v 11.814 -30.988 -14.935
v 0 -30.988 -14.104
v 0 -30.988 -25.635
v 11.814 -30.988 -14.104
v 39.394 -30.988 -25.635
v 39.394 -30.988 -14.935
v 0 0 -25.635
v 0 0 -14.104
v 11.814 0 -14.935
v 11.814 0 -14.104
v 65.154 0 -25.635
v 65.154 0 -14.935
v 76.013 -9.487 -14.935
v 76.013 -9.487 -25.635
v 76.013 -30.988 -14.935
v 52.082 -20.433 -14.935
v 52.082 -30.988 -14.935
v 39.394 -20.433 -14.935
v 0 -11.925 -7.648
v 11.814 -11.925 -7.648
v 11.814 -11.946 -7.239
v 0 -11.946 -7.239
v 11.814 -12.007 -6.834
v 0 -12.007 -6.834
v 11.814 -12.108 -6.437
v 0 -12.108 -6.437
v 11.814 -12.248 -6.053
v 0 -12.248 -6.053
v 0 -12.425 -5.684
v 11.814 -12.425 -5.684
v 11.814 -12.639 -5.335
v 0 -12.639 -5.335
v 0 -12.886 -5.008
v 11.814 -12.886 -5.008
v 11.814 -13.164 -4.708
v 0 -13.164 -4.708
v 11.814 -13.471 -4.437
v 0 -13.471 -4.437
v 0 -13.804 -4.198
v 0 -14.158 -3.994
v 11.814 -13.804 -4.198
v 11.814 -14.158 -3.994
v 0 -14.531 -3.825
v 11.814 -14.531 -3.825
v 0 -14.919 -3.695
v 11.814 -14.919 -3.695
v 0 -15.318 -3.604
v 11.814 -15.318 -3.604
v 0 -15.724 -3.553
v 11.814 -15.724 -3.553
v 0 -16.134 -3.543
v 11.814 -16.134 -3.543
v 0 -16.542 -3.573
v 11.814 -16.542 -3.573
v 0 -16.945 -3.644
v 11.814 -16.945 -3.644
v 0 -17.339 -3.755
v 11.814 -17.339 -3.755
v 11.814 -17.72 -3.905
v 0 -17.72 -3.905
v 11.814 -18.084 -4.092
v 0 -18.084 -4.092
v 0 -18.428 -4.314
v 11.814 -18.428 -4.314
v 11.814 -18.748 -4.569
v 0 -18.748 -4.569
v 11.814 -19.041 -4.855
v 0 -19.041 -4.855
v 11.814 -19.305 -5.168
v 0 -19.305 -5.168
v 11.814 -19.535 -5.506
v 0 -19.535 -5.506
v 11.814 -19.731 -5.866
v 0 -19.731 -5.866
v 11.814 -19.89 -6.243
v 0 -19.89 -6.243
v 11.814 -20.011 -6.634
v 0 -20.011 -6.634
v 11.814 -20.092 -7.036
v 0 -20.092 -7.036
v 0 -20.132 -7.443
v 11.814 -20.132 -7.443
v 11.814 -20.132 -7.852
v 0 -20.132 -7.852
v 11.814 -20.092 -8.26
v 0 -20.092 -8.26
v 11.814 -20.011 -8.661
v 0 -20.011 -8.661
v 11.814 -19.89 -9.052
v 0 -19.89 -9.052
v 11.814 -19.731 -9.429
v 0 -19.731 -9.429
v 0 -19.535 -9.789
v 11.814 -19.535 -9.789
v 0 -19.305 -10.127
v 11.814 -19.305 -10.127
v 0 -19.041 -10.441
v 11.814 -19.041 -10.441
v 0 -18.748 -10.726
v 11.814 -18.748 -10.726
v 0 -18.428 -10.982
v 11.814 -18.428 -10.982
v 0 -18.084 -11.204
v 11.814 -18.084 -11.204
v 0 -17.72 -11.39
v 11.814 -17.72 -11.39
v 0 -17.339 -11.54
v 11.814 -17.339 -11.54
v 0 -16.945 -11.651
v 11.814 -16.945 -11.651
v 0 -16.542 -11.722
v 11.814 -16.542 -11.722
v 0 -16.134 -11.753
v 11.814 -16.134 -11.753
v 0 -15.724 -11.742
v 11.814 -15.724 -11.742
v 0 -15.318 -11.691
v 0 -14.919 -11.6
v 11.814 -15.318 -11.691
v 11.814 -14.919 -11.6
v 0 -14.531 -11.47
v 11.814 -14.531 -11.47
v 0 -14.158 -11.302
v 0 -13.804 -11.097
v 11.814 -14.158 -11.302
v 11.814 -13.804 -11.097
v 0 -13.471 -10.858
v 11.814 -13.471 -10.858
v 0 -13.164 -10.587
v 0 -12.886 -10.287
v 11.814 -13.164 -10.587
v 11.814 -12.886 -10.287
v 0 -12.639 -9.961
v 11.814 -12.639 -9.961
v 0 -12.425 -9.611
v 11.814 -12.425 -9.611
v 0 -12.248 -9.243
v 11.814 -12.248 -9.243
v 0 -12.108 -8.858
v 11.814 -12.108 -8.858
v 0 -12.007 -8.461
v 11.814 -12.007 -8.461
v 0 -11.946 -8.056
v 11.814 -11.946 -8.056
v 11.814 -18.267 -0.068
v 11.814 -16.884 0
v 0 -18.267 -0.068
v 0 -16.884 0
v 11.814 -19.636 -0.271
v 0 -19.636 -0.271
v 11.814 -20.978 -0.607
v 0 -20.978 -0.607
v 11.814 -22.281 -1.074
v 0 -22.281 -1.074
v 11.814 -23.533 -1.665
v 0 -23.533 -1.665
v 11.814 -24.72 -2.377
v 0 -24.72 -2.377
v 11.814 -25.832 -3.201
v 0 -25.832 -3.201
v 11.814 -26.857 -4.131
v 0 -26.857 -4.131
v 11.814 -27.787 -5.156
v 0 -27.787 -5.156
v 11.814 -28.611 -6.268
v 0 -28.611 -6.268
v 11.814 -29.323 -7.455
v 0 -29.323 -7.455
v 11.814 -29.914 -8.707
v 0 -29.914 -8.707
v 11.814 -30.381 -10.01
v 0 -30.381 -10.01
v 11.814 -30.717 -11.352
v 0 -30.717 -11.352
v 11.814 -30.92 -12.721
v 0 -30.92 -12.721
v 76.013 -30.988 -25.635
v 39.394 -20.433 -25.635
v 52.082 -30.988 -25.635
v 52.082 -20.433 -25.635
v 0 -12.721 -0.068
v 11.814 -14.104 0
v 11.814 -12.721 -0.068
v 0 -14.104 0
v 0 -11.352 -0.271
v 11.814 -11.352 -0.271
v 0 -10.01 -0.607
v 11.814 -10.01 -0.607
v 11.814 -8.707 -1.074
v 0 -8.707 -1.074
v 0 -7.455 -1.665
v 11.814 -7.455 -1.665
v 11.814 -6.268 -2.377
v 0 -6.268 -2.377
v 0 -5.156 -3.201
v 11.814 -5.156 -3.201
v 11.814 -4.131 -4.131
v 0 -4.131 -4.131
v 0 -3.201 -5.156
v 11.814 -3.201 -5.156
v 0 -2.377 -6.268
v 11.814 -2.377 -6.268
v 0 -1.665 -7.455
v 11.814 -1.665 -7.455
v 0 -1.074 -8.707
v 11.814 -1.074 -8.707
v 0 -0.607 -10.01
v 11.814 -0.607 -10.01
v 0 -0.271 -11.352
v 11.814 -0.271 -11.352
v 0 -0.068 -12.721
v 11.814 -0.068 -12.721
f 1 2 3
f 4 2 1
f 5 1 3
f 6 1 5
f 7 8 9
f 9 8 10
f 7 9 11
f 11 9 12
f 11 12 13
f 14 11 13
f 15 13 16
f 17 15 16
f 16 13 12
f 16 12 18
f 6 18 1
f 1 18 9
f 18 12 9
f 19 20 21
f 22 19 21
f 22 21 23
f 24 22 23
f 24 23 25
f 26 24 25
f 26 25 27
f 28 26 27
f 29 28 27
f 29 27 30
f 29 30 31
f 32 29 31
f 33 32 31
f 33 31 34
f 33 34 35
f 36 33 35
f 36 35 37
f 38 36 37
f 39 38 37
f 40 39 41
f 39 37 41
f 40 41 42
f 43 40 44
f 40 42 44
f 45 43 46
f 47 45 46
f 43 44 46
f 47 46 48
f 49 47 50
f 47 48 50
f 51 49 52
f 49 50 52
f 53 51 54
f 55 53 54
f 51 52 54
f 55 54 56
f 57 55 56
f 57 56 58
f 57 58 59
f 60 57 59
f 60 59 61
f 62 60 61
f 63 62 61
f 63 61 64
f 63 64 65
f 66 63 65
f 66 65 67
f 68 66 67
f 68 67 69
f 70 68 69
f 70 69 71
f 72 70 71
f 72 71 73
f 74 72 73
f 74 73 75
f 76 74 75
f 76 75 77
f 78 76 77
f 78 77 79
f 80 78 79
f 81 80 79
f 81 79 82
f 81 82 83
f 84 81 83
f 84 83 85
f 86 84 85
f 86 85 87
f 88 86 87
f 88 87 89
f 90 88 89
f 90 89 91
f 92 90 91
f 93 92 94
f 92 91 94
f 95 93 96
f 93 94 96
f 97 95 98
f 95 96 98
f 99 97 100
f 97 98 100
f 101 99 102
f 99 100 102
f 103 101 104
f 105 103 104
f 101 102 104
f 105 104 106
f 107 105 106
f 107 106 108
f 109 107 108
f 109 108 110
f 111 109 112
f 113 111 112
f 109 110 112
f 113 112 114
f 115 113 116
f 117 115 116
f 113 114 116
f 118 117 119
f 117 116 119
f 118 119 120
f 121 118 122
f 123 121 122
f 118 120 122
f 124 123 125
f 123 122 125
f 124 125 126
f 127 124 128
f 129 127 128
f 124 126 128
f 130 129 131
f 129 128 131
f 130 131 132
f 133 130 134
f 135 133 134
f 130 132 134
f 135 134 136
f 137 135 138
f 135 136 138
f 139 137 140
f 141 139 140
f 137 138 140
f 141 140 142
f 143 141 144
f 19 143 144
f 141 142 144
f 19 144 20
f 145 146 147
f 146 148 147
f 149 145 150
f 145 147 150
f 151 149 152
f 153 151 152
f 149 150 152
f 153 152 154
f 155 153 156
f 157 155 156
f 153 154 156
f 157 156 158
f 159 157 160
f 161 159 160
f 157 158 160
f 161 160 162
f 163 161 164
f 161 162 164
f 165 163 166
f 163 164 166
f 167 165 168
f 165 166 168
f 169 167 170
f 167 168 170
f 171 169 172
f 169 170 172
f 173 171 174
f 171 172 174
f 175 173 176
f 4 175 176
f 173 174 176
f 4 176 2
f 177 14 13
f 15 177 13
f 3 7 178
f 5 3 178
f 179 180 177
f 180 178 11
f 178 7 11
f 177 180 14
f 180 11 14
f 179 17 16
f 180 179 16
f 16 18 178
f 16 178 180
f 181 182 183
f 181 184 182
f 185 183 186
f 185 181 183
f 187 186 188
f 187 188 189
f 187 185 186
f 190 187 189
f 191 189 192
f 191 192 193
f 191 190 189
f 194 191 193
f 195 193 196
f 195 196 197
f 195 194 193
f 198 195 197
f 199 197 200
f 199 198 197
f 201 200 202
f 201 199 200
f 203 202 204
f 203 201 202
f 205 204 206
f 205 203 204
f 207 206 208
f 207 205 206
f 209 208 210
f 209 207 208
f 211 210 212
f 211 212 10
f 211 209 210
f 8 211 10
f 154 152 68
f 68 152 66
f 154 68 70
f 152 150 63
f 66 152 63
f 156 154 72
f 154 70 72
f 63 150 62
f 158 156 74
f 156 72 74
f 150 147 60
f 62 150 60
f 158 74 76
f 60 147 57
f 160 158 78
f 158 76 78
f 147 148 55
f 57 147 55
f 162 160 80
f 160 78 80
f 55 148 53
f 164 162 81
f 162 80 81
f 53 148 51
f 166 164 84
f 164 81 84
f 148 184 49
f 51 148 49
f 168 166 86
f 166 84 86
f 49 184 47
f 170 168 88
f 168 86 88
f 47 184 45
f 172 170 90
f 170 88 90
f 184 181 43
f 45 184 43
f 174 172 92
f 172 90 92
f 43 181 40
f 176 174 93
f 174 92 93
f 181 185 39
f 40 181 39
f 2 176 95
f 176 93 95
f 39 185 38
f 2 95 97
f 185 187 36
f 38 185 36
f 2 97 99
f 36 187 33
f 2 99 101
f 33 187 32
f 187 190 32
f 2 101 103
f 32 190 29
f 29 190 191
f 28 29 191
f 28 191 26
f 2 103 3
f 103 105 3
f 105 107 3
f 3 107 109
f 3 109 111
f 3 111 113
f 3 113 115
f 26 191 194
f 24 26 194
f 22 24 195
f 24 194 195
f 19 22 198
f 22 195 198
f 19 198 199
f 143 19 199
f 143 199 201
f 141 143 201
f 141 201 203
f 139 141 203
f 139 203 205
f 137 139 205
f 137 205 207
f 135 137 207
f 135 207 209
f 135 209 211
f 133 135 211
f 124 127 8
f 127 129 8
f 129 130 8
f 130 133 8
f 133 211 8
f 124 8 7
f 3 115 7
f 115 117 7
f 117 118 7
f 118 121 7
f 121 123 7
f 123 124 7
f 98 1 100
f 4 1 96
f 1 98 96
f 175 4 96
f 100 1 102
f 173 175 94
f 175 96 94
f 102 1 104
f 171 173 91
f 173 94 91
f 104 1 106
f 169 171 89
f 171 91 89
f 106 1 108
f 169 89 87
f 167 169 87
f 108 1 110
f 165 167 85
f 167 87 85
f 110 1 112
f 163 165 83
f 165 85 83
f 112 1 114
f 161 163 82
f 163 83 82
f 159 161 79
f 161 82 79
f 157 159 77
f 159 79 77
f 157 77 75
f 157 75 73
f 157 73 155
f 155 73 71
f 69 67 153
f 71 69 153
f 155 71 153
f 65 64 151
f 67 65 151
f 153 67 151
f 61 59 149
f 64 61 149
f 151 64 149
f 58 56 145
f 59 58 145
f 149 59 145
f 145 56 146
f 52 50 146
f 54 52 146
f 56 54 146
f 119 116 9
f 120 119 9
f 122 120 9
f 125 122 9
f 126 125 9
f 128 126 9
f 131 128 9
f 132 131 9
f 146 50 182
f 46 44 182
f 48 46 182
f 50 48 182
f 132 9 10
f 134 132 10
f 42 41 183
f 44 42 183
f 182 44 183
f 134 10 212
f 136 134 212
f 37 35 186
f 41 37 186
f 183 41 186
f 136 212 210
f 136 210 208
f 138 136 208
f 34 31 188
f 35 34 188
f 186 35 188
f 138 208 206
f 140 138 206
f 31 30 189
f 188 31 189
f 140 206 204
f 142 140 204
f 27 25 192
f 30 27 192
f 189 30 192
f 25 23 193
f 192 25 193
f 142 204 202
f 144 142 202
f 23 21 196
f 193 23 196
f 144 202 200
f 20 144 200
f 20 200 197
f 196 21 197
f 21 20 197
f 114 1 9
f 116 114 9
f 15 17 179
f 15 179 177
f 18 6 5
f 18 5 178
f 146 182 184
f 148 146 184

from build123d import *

# Parameters (mm, degrees)
F1_DEPTH = 30.988
F2_W     = 12.6881152391
F2_H     = 10.5545610582
F3_DEPTH = 25.4
F4_DEPTH = 25.4
F5_R     = 4.1061921306
F6_DEPTH = 25.4
F7_R     = 14.1038356314


with BuildPart() as f1:
    # F0 (on Front) → F1 (new body)
    with BuildSketch(Plane.XZ):
        Polygon((11.8142822757, 0), (0, 0), (0, -25.6347749382), (76.0126635432, -25.6347749382), (76.0126635432, -14.9350436404), (11.8142822757, -14.9350436404), align=None)
    extrude(amount=F1_DEPTH)

    # F2 (on face) → F3 (cut)
    with BuildSketch(Plane.XY.offset(-14.9350436404)):
        with Locations((45.7378029823, -25.7107194709)):
            Rectangle(F2_W, F2_H)
    extrude(amount=-F3_DEPTH, mode=Mode.SUBTRACT)

    # F2 (on face) → F4 (cut)
    with BuildSketch(Plane.XY.offset(-14.9350436404)):
        Polygon((76.0126635432, 0), (65.1537999511, 0), (76.0126635432, -9.4870273024), align=None)
        with Locations((45.7378029823, -25.7107194709)):
            Rectangle(F2_W, F2_H)
    extrude(amount=-F4_DEPTH, mode=Mode.SUBTRACT)

    # F5 (on face) → F6 (cut)
    with BuildSketch(Plane.YZ.offset(11.8142822757)):
        with Locations((-16.0313341767, -7.6476014219)):
            Circle(F5_R)
    extrude(amount=-F6_DEPTH, mode=Mode.SUBTRACT)

    # F7
    f7_edges = [f1.edges().sort_by_distance(p)[0] for p in [
        (5.907141, -30.988, 0),
        (5.907141, 0, 0),
    ]]
    fillet(f7_edges, radius=F7_R)


solid = f1.part
